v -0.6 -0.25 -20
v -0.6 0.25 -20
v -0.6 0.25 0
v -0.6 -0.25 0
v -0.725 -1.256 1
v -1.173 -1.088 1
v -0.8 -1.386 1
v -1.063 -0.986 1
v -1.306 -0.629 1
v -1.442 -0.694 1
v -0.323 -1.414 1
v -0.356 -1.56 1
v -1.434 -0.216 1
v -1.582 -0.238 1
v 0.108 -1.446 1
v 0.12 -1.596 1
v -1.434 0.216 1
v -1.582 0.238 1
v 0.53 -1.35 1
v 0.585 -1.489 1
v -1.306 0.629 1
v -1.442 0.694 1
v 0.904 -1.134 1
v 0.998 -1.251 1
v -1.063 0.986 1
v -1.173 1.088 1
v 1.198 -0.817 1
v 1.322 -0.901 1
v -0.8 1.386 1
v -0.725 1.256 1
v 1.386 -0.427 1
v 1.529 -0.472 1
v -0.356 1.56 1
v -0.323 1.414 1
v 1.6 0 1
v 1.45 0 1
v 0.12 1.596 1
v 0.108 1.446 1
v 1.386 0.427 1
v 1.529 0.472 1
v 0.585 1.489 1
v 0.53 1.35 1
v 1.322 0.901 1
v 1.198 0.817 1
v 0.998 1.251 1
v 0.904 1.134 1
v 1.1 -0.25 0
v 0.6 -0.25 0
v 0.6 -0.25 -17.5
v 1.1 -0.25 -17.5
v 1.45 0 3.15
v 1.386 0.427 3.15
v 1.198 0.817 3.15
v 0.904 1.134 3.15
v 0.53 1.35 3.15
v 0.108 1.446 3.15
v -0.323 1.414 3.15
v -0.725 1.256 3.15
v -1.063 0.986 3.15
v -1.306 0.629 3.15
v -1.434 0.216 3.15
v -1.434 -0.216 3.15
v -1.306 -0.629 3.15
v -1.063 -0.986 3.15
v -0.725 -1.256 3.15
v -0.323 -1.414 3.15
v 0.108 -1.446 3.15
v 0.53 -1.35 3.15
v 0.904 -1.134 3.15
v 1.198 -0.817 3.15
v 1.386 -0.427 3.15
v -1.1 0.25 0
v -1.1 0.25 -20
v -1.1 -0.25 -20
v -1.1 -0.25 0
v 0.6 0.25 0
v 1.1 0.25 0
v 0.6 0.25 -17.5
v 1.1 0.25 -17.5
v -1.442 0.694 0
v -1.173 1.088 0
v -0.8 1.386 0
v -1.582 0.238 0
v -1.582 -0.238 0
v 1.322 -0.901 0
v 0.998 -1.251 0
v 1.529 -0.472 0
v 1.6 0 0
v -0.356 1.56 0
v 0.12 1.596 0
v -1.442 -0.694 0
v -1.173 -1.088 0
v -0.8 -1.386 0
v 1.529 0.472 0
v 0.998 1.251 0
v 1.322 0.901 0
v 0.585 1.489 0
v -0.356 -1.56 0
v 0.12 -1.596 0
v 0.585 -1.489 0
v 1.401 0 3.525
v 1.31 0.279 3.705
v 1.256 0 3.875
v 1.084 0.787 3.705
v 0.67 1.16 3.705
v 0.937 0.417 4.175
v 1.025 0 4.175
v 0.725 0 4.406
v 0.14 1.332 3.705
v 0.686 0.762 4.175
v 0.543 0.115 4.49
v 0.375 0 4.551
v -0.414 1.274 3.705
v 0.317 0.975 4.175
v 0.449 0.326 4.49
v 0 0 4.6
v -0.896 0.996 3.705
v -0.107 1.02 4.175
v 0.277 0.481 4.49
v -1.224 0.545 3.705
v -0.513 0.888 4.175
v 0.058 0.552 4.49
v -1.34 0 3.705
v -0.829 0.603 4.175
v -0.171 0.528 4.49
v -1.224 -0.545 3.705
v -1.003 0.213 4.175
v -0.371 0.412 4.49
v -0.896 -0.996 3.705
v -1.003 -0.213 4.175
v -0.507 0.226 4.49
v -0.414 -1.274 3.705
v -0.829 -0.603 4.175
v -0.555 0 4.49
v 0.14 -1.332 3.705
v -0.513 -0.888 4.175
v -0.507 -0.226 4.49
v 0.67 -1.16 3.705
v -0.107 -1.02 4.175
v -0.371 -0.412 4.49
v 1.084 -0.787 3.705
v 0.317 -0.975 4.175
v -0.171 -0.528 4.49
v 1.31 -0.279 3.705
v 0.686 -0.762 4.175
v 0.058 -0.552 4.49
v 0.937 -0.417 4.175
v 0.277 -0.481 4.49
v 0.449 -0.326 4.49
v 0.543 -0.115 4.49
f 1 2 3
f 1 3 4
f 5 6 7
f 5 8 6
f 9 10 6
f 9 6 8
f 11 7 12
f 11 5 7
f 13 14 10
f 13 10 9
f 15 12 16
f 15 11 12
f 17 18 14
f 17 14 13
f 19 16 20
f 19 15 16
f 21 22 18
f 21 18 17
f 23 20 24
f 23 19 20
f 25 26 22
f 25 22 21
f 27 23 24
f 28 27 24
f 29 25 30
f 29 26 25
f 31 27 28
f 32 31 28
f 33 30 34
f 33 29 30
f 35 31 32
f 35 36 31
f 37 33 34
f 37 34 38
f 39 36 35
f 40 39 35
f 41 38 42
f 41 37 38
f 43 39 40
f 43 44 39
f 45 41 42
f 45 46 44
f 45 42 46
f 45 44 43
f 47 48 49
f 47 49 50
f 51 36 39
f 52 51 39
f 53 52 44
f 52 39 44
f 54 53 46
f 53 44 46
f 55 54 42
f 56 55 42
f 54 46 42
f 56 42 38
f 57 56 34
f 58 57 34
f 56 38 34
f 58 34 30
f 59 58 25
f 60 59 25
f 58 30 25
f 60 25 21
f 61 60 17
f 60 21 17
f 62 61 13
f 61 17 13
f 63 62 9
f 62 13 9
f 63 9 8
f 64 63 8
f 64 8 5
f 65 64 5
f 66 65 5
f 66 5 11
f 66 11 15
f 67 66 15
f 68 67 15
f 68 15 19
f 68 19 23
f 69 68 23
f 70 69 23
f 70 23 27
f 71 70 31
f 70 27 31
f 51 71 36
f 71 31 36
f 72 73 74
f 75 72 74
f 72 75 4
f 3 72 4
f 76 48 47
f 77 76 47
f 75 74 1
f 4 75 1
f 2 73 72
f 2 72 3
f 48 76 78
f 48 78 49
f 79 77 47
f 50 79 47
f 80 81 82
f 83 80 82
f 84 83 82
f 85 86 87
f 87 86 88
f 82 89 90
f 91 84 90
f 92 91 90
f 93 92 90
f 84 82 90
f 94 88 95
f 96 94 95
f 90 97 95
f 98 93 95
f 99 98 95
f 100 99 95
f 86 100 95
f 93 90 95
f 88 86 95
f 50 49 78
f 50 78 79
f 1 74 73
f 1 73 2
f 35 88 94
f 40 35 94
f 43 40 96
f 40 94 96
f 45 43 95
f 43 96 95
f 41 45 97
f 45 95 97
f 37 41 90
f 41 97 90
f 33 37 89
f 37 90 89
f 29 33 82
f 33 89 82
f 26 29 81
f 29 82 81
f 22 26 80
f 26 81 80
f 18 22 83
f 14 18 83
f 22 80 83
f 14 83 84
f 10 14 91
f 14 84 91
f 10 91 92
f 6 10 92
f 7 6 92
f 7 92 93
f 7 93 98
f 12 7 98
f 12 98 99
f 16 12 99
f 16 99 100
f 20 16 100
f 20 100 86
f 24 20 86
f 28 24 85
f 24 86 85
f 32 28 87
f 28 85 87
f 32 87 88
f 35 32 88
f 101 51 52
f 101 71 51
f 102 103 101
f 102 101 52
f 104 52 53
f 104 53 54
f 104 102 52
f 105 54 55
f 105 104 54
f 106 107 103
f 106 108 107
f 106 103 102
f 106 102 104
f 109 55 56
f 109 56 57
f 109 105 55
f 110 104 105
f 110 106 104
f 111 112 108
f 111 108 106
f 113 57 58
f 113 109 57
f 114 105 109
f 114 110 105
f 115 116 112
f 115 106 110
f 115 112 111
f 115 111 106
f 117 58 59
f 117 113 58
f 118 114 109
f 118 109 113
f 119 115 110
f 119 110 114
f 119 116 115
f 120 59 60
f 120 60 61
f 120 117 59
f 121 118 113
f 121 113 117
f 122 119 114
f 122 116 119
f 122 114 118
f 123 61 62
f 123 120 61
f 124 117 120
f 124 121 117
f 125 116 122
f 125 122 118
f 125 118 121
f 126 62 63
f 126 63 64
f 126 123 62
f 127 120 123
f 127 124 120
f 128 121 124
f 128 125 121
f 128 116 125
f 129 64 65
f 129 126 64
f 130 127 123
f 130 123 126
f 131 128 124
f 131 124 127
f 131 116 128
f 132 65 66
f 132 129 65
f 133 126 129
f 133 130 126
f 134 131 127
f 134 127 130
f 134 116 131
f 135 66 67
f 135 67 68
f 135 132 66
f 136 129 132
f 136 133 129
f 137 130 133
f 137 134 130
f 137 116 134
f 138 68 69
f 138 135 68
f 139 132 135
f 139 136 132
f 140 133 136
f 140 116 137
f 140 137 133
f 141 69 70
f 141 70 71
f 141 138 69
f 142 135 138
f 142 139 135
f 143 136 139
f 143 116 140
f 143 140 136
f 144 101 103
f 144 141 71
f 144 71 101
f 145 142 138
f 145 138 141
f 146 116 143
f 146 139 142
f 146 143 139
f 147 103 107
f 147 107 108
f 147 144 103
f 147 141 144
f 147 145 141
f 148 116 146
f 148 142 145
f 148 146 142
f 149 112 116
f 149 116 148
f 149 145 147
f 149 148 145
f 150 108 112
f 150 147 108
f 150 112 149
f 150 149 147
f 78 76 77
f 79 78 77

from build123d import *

# Parameters (mm, degrees)
F0_R     = 1.6
F1_DEPTH = 1
F2_R     = 1.45
F3_DEPTH = 3.6
F4_R     = 1.45
F5_W     = 0.5
F5_H     = 0.5
F6_DEPTH = 17.5
F7_DEPTH = 20


with BuildPart() as f1:
    # F0 (on Top) → F1 (new body)
    with BuildSketch(Plane.XY):
        Circle(F0_R)
    extrude(amount=F1_DEPTH)

    # F2 (on face) → F3 (join)
    with BuildSketch(Plane.XY.offset(1)):
        Circle(F2_R)
    extrude(amount=F3_DEPTH)

    # F4
    f4_edges = [f1.edges().sort_by_distance(p)[0] for p in [
        (-1.45, 0, 4.6),
    ]]
    fillet(f4_edges, radius=F4_R)


with BuildPart() as f6:
    # F5 (on face) → F6 (new body)
    with BuildSketch(Plane(origin=(0, 0, 0), x_dir=(1, 0, 0), z_dir=(0, 0, -1))):
        with Locations((0.85, 0)):
            Rectangle(F5_W, F5_H)
    extrude(amount=F6_DEPTH)


with BuildPart() as f7:
    # F5 (on face) → F7 (new body)
    with BuildSketch(Plane(origin=(0, 0, 0), x_dir=(1, 0, 0), z_dir=(0, 0, -1))):
        with Locations((-0.85, 0)):
            Rectangle(F5_W, F5_H)
    extrude(amount=F7_DEPTH)


solid = Compound([f1.part, f6.part, f7.part])
